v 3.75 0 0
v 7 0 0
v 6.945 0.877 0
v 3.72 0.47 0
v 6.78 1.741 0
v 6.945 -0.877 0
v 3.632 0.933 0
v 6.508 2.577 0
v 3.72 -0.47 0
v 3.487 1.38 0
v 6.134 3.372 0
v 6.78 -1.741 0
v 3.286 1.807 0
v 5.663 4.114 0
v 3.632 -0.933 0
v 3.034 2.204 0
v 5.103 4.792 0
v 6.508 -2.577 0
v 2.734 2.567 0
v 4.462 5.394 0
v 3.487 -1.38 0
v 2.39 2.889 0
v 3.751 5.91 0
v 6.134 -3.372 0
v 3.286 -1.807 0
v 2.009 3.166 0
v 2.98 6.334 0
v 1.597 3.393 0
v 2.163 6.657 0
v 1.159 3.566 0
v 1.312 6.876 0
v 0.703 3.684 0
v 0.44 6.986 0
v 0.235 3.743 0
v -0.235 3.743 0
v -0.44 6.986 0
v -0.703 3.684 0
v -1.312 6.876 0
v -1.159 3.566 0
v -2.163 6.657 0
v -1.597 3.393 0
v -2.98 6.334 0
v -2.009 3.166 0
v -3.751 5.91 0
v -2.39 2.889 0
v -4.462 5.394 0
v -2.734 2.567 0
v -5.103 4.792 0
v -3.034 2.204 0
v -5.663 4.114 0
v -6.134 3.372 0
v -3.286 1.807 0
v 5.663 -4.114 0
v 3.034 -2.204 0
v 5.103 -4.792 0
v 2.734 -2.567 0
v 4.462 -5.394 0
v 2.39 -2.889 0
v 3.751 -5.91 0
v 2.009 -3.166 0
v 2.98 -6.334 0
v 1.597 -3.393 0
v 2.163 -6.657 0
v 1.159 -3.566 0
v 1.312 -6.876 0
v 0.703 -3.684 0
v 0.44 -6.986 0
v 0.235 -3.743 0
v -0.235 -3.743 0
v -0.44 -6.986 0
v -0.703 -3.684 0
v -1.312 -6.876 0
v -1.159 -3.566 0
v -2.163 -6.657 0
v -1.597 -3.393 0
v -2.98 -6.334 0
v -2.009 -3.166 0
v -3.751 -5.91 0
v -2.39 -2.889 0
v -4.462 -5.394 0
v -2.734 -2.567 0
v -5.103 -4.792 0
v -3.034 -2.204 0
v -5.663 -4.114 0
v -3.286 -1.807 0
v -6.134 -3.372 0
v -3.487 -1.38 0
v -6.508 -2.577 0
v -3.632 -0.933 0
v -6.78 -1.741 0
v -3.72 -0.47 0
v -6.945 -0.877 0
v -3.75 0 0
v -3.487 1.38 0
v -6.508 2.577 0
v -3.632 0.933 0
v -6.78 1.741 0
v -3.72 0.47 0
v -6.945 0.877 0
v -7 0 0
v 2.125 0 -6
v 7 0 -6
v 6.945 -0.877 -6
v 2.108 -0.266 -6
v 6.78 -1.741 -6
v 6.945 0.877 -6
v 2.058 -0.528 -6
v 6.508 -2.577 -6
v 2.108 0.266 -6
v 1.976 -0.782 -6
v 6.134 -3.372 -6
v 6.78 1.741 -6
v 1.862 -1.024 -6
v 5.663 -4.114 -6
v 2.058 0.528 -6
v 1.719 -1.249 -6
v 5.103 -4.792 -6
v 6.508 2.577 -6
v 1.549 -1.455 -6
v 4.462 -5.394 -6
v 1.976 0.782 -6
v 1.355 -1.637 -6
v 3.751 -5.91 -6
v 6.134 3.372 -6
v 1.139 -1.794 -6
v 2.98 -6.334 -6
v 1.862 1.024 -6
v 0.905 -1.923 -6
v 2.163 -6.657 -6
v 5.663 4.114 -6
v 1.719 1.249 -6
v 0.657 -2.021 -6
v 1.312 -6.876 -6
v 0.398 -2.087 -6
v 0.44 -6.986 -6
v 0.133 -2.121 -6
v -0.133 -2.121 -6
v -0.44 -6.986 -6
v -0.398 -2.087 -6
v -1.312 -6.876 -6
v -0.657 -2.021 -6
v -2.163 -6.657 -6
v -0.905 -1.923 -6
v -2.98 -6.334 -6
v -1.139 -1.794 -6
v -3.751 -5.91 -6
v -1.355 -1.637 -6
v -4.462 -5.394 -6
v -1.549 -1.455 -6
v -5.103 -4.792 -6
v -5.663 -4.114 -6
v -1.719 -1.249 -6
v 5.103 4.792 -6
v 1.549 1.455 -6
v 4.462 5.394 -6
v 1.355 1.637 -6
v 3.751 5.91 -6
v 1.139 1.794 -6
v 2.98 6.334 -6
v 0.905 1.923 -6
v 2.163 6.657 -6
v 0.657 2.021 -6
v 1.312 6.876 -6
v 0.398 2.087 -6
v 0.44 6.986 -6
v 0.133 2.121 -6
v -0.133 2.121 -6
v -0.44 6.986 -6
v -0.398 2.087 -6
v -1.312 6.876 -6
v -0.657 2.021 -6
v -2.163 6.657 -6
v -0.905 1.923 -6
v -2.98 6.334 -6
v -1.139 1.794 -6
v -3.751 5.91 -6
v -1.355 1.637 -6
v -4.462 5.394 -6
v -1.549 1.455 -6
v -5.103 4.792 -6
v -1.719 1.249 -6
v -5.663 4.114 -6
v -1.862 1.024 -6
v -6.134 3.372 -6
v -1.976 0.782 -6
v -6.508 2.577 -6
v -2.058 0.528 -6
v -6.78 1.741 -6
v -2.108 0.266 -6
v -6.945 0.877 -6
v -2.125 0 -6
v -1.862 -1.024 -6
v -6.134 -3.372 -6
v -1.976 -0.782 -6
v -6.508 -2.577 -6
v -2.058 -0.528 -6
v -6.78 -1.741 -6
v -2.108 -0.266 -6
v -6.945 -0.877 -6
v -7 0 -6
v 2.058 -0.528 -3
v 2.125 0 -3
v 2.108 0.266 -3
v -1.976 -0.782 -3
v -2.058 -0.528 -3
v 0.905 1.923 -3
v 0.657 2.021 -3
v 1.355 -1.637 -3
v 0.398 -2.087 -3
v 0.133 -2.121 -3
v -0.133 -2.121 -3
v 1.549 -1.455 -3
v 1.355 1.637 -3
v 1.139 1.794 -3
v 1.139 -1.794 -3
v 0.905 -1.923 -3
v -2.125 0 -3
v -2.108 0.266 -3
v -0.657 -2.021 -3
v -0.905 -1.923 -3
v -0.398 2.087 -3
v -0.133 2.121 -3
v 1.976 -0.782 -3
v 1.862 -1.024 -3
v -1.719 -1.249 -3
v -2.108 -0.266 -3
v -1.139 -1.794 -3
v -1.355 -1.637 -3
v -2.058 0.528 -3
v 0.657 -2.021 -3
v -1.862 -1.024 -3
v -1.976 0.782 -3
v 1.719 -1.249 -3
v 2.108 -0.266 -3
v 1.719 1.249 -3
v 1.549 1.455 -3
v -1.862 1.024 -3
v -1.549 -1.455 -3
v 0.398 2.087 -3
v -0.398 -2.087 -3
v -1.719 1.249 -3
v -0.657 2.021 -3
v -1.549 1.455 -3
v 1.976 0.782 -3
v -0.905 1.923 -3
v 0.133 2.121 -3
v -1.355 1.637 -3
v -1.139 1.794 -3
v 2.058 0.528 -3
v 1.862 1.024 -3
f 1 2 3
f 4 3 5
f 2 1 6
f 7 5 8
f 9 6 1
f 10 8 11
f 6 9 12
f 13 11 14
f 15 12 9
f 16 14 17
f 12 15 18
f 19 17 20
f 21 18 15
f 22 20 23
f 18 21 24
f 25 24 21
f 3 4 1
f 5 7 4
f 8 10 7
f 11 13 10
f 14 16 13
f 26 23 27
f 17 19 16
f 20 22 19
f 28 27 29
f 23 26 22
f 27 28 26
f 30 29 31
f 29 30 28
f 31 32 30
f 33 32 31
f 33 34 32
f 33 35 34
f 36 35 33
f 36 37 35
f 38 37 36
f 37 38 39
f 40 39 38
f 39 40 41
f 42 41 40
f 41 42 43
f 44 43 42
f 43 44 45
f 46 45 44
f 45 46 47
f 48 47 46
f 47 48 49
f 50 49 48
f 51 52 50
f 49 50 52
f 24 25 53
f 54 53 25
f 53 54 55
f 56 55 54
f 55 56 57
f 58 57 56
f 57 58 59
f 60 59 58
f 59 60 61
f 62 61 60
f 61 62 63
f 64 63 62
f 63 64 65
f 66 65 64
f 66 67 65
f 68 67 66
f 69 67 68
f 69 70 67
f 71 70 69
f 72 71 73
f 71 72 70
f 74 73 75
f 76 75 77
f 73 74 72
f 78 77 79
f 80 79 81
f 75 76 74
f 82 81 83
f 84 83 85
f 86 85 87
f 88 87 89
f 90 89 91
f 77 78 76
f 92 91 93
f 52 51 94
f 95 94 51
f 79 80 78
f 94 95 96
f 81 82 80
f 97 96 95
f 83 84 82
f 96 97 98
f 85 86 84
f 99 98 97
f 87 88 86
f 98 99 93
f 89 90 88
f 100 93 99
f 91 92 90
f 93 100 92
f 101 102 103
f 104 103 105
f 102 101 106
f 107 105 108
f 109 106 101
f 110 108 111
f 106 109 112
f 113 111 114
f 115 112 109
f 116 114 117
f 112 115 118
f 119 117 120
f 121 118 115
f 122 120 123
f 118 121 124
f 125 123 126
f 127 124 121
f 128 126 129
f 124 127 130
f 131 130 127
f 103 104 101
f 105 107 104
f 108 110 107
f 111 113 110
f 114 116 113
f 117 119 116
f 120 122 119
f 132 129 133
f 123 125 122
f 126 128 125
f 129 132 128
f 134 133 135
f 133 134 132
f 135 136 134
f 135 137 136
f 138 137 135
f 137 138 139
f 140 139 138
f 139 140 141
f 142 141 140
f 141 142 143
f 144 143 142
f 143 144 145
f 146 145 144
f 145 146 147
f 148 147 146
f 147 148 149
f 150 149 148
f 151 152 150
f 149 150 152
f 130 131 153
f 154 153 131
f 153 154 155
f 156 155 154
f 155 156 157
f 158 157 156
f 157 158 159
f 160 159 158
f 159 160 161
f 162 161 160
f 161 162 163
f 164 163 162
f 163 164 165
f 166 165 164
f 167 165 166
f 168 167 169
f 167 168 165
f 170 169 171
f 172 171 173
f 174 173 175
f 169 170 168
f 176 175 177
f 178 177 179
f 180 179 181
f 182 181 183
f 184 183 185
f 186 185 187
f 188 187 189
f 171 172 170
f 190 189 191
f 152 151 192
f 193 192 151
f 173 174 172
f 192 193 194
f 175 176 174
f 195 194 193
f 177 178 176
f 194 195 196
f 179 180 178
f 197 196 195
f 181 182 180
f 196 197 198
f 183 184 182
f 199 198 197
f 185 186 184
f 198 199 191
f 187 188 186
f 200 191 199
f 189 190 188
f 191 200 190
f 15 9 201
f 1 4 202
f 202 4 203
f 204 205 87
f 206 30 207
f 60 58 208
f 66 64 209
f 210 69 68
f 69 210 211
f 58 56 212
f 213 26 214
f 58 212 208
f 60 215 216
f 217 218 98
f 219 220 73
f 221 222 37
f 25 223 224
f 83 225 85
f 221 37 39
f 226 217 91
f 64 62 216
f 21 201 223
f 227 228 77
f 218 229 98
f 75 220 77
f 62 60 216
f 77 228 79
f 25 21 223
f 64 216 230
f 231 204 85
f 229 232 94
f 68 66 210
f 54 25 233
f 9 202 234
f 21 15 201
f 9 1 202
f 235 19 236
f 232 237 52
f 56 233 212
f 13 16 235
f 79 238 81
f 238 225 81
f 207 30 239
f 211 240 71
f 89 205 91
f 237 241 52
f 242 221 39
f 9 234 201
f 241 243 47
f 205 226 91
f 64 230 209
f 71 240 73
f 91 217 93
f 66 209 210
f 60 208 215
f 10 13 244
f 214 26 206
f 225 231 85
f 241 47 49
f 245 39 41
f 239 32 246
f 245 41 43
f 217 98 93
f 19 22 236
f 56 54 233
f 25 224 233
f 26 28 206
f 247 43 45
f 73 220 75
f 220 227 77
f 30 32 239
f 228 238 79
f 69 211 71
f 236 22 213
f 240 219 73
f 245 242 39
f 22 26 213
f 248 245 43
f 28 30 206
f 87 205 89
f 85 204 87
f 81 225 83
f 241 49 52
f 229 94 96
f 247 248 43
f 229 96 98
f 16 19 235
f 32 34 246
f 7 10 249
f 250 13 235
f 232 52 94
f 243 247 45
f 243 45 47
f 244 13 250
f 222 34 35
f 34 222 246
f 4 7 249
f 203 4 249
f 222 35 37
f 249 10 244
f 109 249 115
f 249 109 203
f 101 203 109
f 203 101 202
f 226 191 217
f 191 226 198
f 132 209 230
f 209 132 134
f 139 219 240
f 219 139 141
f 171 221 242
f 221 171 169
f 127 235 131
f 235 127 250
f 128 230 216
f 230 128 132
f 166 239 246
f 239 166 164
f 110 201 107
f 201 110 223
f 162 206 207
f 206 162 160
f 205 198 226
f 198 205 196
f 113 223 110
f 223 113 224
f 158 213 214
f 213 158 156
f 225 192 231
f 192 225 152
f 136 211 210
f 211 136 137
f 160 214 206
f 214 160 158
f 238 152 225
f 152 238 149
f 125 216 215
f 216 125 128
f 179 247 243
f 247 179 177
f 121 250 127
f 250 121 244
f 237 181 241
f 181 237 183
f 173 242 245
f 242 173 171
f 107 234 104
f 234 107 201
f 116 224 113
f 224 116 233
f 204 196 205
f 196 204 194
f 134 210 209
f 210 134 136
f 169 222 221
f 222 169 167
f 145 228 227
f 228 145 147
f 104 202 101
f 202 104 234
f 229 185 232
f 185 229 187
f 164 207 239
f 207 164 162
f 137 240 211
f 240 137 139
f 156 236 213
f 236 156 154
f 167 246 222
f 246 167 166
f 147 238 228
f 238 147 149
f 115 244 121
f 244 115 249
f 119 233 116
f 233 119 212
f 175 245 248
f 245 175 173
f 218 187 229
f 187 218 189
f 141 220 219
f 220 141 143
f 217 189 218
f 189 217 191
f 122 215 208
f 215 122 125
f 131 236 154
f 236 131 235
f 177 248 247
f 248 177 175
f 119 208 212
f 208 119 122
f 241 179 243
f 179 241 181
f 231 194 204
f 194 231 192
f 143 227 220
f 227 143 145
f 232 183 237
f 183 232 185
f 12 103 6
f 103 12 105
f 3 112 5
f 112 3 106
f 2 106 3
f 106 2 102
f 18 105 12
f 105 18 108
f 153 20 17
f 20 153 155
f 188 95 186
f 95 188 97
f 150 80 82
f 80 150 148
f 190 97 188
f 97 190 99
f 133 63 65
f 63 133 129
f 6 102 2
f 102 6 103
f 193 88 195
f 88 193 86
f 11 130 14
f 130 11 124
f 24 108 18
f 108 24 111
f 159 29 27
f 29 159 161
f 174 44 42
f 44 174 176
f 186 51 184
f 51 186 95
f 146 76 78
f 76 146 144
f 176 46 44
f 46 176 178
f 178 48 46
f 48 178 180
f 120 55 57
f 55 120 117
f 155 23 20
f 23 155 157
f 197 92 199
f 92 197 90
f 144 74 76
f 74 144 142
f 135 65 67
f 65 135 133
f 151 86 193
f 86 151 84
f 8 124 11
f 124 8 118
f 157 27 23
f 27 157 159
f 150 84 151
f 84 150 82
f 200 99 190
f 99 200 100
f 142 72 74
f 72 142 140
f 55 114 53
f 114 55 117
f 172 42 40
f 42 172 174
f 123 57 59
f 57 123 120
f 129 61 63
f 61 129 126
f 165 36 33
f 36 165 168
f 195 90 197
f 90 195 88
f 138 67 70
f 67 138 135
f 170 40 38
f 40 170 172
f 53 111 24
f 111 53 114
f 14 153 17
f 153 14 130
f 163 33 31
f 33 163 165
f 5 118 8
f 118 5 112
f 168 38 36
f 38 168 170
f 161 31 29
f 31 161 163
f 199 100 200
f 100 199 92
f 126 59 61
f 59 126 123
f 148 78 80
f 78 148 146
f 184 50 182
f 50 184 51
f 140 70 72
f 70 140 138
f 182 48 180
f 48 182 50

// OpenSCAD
$fn = 50;


difference() {
	union() {
		translate(v = [0, 0, -6.0000000000]) {
			cylinder(h = 6, r = 7.0000000000);
		}
		cylinder(h = 0, r = 13.0000000000);
	}
	union() {
		translate(v = [0, 0, 0]) {
			rotate(a = [0, 0, 0]) {
				difference() {
					union() {
						#translate(v = [0, 0, -6.0000000000]) {
							cylinder(h = 6, r = 2.0000000000);
						}
						#translate(v = [0, 0, -3]) {
							cylinder(h = 3, r1 = 2.1250000000, r2 = 3.7500000000);
						}
						#translate(v = [0, 0, -6.0000000000]) {
							cylinder(h = 6, r = 2.1250000000);
						}
						#translate(v = [0, 0, -6.0000000000]) {
							cylinder(h = 6, r = 2.0000000000);
						}
					}
					union();
				}
			}
		}
	}
}
